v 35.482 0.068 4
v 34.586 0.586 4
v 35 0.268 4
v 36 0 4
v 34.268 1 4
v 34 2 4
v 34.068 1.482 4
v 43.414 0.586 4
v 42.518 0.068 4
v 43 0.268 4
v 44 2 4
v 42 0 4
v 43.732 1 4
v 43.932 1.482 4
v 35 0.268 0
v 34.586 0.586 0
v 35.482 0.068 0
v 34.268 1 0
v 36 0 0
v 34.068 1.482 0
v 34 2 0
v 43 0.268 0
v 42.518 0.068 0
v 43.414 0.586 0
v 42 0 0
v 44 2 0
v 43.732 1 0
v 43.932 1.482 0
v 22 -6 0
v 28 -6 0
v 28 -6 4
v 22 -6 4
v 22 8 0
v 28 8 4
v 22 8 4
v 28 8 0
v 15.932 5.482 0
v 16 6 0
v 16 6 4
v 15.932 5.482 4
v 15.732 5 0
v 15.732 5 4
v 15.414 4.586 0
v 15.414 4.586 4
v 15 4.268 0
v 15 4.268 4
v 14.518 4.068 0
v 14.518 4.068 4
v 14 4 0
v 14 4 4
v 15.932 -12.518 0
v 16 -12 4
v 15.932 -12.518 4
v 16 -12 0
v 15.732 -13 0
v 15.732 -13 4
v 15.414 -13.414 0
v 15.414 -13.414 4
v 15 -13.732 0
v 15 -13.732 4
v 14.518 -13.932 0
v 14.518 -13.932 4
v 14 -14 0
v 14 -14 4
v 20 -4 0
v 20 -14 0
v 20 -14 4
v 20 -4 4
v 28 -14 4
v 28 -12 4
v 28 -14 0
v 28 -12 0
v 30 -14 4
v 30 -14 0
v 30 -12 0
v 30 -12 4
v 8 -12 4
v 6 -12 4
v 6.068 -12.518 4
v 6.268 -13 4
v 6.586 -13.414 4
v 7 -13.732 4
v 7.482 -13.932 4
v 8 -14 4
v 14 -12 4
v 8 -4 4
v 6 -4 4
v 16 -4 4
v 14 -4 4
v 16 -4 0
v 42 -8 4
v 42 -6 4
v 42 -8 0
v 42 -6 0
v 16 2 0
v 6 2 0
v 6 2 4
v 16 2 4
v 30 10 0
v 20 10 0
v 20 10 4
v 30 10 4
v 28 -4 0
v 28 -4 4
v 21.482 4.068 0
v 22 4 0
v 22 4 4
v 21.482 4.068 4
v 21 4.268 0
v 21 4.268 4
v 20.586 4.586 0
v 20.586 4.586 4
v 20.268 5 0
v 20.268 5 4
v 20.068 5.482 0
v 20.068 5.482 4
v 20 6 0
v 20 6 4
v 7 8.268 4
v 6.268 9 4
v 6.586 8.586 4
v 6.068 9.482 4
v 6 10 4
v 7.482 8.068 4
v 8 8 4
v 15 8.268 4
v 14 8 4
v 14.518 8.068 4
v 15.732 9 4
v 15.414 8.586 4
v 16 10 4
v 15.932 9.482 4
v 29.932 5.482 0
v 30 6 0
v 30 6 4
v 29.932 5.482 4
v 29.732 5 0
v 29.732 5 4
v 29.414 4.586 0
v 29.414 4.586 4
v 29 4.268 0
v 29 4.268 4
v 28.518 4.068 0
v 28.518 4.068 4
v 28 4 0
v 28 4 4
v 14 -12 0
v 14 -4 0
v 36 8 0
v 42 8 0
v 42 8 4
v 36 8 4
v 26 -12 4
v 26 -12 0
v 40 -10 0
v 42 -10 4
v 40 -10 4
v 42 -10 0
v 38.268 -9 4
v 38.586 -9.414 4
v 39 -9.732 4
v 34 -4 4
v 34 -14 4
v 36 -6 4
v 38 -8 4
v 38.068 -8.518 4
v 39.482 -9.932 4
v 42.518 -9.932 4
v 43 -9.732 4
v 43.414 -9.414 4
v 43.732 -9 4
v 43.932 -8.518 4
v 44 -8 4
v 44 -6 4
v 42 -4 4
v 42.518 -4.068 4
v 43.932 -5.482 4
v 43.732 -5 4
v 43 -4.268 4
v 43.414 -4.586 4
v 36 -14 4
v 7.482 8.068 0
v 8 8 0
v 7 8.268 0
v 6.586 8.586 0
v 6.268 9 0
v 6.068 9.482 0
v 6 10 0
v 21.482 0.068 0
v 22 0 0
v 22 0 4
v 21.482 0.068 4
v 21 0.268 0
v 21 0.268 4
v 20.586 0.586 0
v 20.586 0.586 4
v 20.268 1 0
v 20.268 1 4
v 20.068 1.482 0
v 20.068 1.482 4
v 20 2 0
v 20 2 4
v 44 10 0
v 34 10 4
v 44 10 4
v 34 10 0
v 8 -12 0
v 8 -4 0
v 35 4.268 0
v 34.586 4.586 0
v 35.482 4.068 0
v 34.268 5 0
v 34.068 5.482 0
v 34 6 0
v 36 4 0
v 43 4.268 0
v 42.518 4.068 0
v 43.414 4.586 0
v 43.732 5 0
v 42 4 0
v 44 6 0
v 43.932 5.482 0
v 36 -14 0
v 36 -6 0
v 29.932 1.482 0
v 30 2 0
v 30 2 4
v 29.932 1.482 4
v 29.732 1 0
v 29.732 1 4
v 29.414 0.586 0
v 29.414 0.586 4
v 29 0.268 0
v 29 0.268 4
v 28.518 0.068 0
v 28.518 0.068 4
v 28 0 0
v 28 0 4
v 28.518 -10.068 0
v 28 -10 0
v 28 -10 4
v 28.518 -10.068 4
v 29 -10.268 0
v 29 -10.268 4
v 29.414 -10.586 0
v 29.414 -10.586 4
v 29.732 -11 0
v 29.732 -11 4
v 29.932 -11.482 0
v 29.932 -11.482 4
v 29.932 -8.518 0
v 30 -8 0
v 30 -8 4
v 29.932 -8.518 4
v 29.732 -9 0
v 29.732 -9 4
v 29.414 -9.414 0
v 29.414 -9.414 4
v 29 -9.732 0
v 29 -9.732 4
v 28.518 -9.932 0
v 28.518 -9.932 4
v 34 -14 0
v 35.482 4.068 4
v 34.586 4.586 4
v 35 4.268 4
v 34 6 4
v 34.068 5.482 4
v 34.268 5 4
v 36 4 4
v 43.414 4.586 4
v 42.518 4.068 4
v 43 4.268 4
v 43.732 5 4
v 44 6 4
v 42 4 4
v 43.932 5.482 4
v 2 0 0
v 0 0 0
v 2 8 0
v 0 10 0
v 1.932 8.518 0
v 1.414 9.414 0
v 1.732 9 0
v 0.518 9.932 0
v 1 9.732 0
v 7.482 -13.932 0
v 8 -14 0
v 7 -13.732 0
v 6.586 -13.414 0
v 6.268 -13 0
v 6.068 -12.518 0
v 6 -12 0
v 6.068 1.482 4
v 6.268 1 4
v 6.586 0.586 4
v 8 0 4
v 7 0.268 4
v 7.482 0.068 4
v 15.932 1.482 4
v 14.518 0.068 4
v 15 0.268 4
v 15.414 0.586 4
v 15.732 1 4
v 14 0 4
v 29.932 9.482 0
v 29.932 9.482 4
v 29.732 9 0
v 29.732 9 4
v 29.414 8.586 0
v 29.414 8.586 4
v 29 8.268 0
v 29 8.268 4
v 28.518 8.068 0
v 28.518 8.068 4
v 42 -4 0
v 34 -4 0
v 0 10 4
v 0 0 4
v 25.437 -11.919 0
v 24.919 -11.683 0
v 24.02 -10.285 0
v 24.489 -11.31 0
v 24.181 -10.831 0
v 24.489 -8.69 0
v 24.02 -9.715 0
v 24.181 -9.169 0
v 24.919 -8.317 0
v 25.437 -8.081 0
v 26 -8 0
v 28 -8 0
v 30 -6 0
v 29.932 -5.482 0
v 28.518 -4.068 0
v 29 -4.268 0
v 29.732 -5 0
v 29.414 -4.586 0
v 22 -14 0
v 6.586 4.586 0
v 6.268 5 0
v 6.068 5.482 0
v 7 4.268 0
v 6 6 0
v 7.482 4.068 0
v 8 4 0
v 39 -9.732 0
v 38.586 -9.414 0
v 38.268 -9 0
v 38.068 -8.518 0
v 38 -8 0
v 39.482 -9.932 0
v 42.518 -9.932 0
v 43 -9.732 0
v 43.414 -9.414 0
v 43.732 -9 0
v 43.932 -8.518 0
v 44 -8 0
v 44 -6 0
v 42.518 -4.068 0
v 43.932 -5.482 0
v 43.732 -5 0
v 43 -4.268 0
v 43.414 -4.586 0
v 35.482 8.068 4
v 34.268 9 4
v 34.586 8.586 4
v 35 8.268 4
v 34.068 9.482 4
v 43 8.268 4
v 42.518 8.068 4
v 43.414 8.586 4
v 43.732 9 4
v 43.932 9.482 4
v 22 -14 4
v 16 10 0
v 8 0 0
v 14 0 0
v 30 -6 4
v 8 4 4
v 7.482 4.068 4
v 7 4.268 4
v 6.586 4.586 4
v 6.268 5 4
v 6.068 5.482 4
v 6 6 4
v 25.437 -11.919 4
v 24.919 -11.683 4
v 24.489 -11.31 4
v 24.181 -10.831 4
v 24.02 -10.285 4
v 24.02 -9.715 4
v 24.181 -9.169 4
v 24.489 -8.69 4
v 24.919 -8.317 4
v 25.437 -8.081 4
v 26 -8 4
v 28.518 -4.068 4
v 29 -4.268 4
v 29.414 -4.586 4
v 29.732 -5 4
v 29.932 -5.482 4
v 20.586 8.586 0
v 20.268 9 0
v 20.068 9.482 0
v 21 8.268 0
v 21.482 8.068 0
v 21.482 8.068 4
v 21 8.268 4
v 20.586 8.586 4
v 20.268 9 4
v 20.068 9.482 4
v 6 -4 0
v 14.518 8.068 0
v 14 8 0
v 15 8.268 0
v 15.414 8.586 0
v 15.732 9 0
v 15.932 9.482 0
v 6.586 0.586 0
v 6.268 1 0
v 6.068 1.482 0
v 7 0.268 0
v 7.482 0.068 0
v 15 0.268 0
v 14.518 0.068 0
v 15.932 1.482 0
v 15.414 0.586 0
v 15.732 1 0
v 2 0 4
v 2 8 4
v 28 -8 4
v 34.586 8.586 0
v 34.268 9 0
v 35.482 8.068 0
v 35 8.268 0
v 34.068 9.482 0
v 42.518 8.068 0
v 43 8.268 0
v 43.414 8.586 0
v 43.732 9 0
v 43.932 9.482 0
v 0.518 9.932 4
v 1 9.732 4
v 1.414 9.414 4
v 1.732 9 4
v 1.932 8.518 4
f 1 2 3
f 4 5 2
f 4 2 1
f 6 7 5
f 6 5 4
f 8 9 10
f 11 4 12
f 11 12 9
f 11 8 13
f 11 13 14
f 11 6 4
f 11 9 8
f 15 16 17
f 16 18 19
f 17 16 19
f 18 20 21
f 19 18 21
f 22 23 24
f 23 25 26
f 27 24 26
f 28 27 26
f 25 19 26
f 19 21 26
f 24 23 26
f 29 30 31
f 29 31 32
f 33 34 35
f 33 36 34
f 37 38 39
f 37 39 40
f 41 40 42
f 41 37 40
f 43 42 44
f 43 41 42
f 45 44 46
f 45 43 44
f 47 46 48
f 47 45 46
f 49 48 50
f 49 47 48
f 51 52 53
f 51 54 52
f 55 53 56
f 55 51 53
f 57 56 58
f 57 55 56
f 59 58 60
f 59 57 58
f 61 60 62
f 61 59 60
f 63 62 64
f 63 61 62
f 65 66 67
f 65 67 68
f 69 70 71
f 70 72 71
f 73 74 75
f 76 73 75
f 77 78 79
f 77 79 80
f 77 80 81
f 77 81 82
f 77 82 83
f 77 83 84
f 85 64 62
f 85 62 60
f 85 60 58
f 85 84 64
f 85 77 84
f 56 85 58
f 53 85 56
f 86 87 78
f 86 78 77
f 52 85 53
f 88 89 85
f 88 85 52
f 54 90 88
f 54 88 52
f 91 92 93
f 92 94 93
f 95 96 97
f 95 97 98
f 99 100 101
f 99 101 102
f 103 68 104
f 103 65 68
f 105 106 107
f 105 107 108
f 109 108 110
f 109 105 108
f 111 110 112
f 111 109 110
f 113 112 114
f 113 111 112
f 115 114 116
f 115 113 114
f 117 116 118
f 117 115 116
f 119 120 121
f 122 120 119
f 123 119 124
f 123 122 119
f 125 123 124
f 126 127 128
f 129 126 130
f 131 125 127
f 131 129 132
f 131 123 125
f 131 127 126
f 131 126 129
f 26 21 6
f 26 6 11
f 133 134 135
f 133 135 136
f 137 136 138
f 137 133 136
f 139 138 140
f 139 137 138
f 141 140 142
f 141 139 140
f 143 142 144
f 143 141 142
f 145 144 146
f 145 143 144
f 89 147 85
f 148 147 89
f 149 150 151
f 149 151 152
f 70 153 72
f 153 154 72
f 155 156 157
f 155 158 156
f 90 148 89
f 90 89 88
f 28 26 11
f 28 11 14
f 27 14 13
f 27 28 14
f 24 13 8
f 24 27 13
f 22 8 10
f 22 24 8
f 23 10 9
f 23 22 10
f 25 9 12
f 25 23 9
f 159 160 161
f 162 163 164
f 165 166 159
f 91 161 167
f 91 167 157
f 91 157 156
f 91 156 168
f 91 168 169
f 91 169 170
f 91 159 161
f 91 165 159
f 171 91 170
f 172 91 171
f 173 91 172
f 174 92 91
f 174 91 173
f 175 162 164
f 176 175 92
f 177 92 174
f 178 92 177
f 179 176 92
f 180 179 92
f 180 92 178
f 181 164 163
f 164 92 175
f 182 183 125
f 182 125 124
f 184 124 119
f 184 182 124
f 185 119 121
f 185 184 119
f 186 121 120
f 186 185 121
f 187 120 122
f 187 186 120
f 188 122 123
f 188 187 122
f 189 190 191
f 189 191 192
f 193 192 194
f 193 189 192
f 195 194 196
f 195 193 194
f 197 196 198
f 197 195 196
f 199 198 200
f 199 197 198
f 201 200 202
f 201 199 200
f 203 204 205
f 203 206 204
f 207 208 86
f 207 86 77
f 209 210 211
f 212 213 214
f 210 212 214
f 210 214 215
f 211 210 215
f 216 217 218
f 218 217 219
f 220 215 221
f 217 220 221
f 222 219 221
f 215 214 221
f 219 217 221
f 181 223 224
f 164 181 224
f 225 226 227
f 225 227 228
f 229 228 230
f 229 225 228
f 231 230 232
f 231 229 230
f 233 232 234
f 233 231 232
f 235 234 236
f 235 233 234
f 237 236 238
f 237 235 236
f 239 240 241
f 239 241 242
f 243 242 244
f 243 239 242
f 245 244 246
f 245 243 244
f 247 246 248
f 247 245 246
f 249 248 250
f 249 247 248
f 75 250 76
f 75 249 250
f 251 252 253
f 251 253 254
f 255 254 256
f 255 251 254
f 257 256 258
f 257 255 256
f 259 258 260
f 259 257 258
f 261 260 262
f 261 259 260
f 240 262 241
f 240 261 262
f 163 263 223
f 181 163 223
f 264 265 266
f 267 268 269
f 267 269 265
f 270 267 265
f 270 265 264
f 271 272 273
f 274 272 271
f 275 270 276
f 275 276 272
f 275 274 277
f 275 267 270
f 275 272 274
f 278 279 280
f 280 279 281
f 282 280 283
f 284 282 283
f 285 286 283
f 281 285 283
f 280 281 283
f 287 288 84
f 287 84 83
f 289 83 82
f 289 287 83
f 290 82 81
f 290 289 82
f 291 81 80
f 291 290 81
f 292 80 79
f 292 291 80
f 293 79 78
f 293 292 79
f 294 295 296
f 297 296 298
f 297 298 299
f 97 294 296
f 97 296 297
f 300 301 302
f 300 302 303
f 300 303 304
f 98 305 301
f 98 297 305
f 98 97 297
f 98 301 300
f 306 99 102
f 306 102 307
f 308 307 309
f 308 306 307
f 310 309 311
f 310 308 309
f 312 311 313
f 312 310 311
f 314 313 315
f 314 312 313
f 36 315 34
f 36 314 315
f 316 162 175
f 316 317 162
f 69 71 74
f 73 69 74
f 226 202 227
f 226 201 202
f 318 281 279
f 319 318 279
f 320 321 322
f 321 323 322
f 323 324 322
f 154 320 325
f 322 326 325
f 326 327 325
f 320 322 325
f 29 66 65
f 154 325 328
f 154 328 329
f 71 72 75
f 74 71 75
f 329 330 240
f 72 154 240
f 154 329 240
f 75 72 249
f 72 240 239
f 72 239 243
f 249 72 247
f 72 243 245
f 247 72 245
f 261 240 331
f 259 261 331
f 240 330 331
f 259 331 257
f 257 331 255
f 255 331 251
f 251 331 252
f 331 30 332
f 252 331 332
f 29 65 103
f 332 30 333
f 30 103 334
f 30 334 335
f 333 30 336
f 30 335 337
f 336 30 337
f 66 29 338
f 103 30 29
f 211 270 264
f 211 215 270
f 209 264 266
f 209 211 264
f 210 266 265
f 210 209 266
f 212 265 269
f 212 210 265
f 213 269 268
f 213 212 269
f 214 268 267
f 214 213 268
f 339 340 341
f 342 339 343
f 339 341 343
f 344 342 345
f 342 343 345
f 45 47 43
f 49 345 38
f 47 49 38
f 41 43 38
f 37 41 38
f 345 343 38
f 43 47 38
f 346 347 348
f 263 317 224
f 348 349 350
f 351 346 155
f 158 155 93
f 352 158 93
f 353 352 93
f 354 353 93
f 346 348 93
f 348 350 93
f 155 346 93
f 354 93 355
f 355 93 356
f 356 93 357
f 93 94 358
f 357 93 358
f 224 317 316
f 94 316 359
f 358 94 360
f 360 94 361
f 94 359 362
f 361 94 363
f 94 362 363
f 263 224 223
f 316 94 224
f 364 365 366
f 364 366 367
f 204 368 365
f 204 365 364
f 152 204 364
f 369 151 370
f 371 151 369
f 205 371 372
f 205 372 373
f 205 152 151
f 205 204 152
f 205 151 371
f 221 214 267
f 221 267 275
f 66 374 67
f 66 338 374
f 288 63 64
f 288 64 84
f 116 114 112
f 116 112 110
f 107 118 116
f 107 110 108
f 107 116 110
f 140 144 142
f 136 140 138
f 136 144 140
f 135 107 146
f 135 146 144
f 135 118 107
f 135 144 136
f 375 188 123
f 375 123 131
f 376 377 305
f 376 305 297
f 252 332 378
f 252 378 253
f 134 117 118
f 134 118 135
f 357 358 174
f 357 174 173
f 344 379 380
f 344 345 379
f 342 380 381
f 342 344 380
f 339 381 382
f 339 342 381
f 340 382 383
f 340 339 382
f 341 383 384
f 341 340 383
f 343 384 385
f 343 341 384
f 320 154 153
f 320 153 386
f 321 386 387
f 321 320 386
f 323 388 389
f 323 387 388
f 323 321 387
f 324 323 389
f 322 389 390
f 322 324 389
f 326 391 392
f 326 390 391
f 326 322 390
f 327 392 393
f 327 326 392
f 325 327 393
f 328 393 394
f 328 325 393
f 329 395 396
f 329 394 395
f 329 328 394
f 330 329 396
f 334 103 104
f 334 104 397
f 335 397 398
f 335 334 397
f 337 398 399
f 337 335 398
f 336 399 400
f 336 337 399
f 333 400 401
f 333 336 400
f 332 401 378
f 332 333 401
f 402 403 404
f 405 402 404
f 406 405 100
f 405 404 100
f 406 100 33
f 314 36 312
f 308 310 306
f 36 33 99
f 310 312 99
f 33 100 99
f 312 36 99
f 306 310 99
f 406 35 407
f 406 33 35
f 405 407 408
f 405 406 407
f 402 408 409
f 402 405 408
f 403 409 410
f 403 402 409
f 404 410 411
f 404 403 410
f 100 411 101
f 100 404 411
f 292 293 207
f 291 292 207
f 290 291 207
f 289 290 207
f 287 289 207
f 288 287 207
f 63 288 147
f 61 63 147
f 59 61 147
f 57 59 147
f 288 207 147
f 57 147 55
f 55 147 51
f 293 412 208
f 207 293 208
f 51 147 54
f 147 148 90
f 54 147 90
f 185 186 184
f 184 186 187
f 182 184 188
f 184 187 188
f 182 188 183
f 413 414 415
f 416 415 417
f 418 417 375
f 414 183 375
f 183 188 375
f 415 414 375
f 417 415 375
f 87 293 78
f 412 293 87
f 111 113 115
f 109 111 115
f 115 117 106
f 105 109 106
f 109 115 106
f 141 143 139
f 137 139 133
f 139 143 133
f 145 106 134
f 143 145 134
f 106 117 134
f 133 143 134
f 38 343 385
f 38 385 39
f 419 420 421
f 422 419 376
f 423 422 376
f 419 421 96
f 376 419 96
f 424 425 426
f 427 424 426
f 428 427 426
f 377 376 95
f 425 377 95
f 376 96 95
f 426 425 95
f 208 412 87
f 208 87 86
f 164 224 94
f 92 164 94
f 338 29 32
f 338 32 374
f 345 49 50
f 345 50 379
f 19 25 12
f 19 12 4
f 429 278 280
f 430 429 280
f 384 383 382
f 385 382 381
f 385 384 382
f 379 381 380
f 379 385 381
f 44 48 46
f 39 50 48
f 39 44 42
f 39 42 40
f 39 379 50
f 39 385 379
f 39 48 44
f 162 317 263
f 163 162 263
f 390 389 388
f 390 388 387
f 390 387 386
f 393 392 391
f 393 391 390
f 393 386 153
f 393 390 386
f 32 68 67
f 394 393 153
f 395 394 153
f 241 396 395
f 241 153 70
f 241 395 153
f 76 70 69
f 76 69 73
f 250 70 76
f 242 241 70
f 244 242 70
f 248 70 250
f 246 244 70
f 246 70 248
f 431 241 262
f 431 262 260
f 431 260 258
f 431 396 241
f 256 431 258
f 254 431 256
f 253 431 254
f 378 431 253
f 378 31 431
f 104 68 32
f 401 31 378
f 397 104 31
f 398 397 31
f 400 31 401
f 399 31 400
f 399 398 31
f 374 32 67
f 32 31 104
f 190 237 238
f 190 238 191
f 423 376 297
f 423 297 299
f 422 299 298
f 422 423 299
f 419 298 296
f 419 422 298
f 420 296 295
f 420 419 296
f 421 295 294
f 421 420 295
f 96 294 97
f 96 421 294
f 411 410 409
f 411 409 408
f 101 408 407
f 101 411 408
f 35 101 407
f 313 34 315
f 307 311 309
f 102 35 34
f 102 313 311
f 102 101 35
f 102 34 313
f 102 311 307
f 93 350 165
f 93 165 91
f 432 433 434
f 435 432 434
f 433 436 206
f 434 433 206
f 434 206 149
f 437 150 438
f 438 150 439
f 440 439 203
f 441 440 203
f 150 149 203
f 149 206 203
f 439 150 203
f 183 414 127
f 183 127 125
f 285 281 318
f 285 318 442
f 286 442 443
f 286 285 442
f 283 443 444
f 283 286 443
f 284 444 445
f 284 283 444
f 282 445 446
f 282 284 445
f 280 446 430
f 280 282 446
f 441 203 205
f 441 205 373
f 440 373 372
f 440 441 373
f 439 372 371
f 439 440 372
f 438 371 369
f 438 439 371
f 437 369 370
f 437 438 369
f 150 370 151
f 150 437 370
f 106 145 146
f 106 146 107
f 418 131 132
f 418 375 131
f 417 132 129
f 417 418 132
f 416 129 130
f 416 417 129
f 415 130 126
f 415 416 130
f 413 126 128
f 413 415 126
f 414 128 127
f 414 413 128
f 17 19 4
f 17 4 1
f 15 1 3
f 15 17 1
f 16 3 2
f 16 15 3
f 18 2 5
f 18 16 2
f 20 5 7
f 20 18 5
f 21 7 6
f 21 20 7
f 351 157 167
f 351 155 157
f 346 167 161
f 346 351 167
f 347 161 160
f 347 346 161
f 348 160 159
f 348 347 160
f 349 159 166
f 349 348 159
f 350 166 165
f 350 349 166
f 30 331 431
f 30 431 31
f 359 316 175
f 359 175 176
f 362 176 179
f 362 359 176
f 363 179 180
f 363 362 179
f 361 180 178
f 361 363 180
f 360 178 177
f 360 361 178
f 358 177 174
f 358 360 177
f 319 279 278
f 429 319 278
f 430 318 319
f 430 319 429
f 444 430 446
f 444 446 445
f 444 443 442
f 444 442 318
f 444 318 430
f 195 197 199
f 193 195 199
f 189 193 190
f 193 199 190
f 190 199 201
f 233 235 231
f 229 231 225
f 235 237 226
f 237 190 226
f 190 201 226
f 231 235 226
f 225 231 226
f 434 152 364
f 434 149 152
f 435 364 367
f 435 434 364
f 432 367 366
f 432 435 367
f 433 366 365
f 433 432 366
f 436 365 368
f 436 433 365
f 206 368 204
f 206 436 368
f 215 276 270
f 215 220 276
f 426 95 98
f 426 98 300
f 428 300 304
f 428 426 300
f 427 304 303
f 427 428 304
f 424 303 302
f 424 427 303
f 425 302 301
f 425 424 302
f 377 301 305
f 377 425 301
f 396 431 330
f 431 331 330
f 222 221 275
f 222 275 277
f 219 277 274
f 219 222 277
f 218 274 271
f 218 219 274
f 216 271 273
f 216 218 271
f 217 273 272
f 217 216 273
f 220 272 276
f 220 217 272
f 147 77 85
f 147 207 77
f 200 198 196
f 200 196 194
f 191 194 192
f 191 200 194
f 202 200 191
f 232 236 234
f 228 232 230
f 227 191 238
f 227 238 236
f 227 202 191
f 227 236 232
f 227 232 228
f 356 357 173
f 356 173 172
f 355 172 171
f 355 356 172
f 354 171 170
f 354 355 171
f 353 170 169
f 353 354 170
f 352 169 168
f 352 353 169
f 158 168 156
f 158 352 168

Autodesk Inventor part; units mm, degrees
ref_plane "YZ Plane" through (0, 0, 0) normal (1, 0, 0) x (0, 1, 0)
ref_plane "XZ Plane" through (0, 0, 0) normal (0, 1, 0) x (-1, 0, 0)
ref_plane "XY Plane" through (0, 0, 0) normal (0, 0, 1) x (1, 0, 0)
sketch "Sketch5" plane through (0, 0, 0) normal (0, 0, 1) x (1, 0, 0)
  line L0 (0, 0) -> (2, 0)
  line L1 (2, 0) -> (2, 8)
  line L2 (0, 10) -> (0, 10)
  line L3 (0, 10) -> (0, 0)
  line L4 (6, 10) -> (16, 10)
  line L5 (16, 10) -> (16, 10)
  line L6 (14, 8) -> (8, 8)
  line L7 (6, 10) -> (6, 10)
  line L8 (6, 6) -> (16, 6)
  line L9 (16, 6) -> (16, 6)
  line L10 (14, 4) -> (8, 4)
  line L11 (6, 6) -> (6, 6)
  line L12 (6, 2) -> (16, 2)
  line L13 (16, 2) -> (16, 2)
  line L14 (14, 0) -> (8, 0)
  line L15 (6, 2) -> (6, 2)
  line L16 (20, 10) -> (30, 10)
  line L17 (30, 10) -> (30, 10)
  line L18 (28, 8) -> (22, 8)
  line L19 (20, 10) -> (20, 10)
  line L20 (20, 6) -> (30, 6)
  line L21 (30, 6) -> (30, 6)
  line L22 (28, 4) -> (22, 4)
  line L23 (20, 6) -> (20, 6)
  line L24 (20, 2) -> (30, 2)
  line L25 (30, 2) -> (30, 2)
  line L26 (28, 0) -> (22, 0)
  line L27 (20, 2) -> (20, 2)
  line L28 (34, 10) -> (44, 10)
  line L29 (44, 10) -> (44, 10)
  line L30 (42, 8) -> (36, 8)
  line L31 (34, 10) -> (34, 10)
  line L32 (34, 6) -> (44, 6)
  line L33 (44, 6) -> (44, 6)
  line L34 (42, 4) -> (36, 4)
  line L35 (34, 6) -> (34, 6)
  line L36 (34, 2) -> (44, 2)
  line L37 (44, 2) -> (44, 2)
  line L38 (42, 0) -> (36, 0)
  line L39 (34, 2) -> (34, 2)
  arc A0 (2, 8) -> (0, 10) centre (0, 8) ccw
  arc A1 (6, 10) -> (8, 8) centre (8, 10) ccw
  arc A2 (6, 6) -> (8, 4) centre (8, 6) ccw
  arc A3 (6, 2) -> (8, 0) centre (8, 2) ccw
  arc A4 (14, 0) -> (16, 2) centre (14, 2) ccw
  arc A5 (14, 4) -> (16, 6) centre (14, 6) ccw
  arc A6 (14, 8) -> (16, 10) centre (14, 10) ccw
  arc A7 (20, 10) -> (22, 8) centre (22, 10) ccw
  arc A8 (20, 6) -> (22, 4) centre (22, 6) ccw
  arc A9 (20, 2) -> (22, 0) centre (22, 2) ccw
  arc A10 (28, 0) -> (30, 2) centre (28, 2) ccw
  arc A11 (28, 4) -> (30, 6) centre (28, 6) ccw
  arc A12 (28, 8) -> (30, 10) centre (28, 10) ccw
  arc A13 (34, 10) -> (36, 8) centre (36, 10) ccw
  arc A14 (34, 6) -> (36, 4) centre (36, 6) ccw
  arc A15 (34, 2) -> (36, 0) centre (36, 2) ccw
  arc A16 (42, 0) -> (44, 2) centre (42, 2) ccw
  arc A17 (42, 4) -> (44, 6) centre (42, 6) ccw
  arc A18 (42, 8) -> (44, 10) centre (42, 10) ccw
  line L40 (6, -4) -> (8, -4)
  line L41 (8, -4) -> (8, -12)
  line L42 (8, -12) -> (14, -12)
  line L43 (14, -12) -> (14, -4)
  line L44 (14, -4) -> (16, -4)
  line L45 (16, -4) -> (16, -12)
  line L46 (14, -14) -> (8, -14)
  line L47 (6, -12) -> (6, -4)
  arc A19 (6, -12) -> (8, -14) centre (8, -12) ccw
  arc A20 (14, -14) -> (16, -12) centre (14, -12) ccw
  line L48 (6, 0) -> (6, 10) construction
  line L49 (20, 10) -> (20, 0) construction
  line L50 (34, -4) -> (34, -14)
  line L51 (34, -4) -> (42, -4)
  line L52 (34, -14) -> (36, -14)
  line L53 (36, -14) -> (36, -6)
  line L54 (36, -6) -> (42, -6)
  line L55 (42, -6) -> (42, -8)
  line L56 (38, -8) -> (42, -8)
  line L57 (38, -8) -> (38, -8)
  line L58 (44, -6) -> (44, -8)
  line L59 (42, -10) -> (40, -10)
  line L60 (34, 10) -> (34, 0) construction
  arc A21 (38, -8) -> (40, -10) centre (40, -8) ccw
  arc A22 (42, -10) -> (44, -8) centre (42, -8) ccw
  arc A23 (44, -6) -> (42, -4) centre (42, -6) ccw
  line L61 (20, -4) -> (22, -4)
  line L62 (22, -6) -> (22, -14)
  line L63 (22, -14) -> (20, -14)
  line L64 (20, -14) -> (20, -4)
  line L65 (20, -4) -> (28, -4)
  line L66 (30, -6) -> (30, -6)
  line L67 (30, -6) -> (22, -6)
  line L68 (20, -6) -> (20, -4)
  arc A24 (30, -6) -> (28, -4) centre (28, -6) ccw
  line L69 (28, -6) -> (30, -6)
  line L70 (30, -6) -> (30, -8)
  line L71 (28, -10) -> (28, -10)
  line L72 (28, -10) -> (28, -6)
  arc A25 (28, -10) -> (30, -8) centre (28, -8) ccw
  line L73 (28, -8) -> (26, -8)
  line L74 (24, -10) -> (24, -10)
  line L75 (26, -12) -> (28, -12)
  line L76 (28, -12) -> (28, -8)
  arc A26 (26, -8) -> (24, -10) centre (26, -10) ccw
  arc A27 (24, -10) -> (26, -12) centre (26, -10) ccw
  line L77 (28, -14) -> (30, -14)
  line L78 (30, -14) -> (30, -12)
  line L79 (28, -10) -> (28, -10)
  line L80 (28, -10) -> (28, -14)
  arc A28 (30, -12) -> (28, -10) centre (28, -12) ccw
  point P0 (2, 10)
  point P1 (16, 8)
  point P2 (6, 8)
  point P3 (16, 4)
  point P4 (6, 4)
  point P5 (16, 0)
  point P6 (30, 8)
  point P7 (20, 8)
  point P8 (30, 4)
  point P9 (20, 4)
  point P10 (30, 0)
  point P11 (44, 8)
  point P12 (34, 8)
  point P13 (44, 4)
  point P14 (34, 4)
  point P15 (44, 0)
  point P16 (44, -4)
  point P17 (38, -10)
  point P18 (30, -4)
  dimension "d59" = 2
  dimension "d60" = 10
  dimension "d61" = 10
  dimension "d62" = 2
  dimension "d63" = 10
  dimension "d64" = 2
  dimension "d65" = 10
  dimension "d66" = 2
  dimension "d67" = 4
  dimension "d68" = 2
  dimension "d69" = 10
  dimension "d70" = 2
  dimension "d71" = 4
  dimension "d72" = 10
  dimension "d73" = 2
  dimension "d74" = 10
  dimension "d75" = 2
  dimension "d76" = 10
  dimension "d77" = 2
  dimension "d78" = 4
  dimension "d79" = 10
  dimension "d80" = 2
  dimension "d81" = 10
  dimension "d82" = 2
  dimension "d83" = 2
  dimension "d84" = 4
  dimension "d85" = 2
  dimension "d86" = 2
  dimension "d87" = 2
  dimension "d88" = 2
  dimension "d89" = 10
  dimension "d90" = 10
  dimension "d101" = 2
  dimension "d102" = 2
  dimension "d103" = 2
  dimension "d104" = 2
  dimension "d105" = 2
  dimension "d106" = 10
  dimension "d107" = 6
  dimension "d120" = 2
  dimension "d121" = 4
  dimension "d122" = 2
  dimension "d123" = 10
  dimension "d124" = 2
  dimension "d125" = 2
  dimension "d126" = 2
  dimension "d127" = 4
  dimension "d128" = 4
  dimension "d129" = 2
  dimension "d130" = 2
extrude "Extrusion3" add sketch "Sketch5" along normal blind 4
equation "\"d67\" = 2 * d59"
equation "\"d68\" = d59"
equation "\"d71\" = d67"
equation "\"d78\" = d67"
equation "\"d84\" = d67"
equation "\"d85\" = d59"
equation "\"d86\" = d59"
equation "\"d87\" = d59"
equation "\"d89\" = d60"
equation "\"d90\" = d89"
properties part number "ieee"
